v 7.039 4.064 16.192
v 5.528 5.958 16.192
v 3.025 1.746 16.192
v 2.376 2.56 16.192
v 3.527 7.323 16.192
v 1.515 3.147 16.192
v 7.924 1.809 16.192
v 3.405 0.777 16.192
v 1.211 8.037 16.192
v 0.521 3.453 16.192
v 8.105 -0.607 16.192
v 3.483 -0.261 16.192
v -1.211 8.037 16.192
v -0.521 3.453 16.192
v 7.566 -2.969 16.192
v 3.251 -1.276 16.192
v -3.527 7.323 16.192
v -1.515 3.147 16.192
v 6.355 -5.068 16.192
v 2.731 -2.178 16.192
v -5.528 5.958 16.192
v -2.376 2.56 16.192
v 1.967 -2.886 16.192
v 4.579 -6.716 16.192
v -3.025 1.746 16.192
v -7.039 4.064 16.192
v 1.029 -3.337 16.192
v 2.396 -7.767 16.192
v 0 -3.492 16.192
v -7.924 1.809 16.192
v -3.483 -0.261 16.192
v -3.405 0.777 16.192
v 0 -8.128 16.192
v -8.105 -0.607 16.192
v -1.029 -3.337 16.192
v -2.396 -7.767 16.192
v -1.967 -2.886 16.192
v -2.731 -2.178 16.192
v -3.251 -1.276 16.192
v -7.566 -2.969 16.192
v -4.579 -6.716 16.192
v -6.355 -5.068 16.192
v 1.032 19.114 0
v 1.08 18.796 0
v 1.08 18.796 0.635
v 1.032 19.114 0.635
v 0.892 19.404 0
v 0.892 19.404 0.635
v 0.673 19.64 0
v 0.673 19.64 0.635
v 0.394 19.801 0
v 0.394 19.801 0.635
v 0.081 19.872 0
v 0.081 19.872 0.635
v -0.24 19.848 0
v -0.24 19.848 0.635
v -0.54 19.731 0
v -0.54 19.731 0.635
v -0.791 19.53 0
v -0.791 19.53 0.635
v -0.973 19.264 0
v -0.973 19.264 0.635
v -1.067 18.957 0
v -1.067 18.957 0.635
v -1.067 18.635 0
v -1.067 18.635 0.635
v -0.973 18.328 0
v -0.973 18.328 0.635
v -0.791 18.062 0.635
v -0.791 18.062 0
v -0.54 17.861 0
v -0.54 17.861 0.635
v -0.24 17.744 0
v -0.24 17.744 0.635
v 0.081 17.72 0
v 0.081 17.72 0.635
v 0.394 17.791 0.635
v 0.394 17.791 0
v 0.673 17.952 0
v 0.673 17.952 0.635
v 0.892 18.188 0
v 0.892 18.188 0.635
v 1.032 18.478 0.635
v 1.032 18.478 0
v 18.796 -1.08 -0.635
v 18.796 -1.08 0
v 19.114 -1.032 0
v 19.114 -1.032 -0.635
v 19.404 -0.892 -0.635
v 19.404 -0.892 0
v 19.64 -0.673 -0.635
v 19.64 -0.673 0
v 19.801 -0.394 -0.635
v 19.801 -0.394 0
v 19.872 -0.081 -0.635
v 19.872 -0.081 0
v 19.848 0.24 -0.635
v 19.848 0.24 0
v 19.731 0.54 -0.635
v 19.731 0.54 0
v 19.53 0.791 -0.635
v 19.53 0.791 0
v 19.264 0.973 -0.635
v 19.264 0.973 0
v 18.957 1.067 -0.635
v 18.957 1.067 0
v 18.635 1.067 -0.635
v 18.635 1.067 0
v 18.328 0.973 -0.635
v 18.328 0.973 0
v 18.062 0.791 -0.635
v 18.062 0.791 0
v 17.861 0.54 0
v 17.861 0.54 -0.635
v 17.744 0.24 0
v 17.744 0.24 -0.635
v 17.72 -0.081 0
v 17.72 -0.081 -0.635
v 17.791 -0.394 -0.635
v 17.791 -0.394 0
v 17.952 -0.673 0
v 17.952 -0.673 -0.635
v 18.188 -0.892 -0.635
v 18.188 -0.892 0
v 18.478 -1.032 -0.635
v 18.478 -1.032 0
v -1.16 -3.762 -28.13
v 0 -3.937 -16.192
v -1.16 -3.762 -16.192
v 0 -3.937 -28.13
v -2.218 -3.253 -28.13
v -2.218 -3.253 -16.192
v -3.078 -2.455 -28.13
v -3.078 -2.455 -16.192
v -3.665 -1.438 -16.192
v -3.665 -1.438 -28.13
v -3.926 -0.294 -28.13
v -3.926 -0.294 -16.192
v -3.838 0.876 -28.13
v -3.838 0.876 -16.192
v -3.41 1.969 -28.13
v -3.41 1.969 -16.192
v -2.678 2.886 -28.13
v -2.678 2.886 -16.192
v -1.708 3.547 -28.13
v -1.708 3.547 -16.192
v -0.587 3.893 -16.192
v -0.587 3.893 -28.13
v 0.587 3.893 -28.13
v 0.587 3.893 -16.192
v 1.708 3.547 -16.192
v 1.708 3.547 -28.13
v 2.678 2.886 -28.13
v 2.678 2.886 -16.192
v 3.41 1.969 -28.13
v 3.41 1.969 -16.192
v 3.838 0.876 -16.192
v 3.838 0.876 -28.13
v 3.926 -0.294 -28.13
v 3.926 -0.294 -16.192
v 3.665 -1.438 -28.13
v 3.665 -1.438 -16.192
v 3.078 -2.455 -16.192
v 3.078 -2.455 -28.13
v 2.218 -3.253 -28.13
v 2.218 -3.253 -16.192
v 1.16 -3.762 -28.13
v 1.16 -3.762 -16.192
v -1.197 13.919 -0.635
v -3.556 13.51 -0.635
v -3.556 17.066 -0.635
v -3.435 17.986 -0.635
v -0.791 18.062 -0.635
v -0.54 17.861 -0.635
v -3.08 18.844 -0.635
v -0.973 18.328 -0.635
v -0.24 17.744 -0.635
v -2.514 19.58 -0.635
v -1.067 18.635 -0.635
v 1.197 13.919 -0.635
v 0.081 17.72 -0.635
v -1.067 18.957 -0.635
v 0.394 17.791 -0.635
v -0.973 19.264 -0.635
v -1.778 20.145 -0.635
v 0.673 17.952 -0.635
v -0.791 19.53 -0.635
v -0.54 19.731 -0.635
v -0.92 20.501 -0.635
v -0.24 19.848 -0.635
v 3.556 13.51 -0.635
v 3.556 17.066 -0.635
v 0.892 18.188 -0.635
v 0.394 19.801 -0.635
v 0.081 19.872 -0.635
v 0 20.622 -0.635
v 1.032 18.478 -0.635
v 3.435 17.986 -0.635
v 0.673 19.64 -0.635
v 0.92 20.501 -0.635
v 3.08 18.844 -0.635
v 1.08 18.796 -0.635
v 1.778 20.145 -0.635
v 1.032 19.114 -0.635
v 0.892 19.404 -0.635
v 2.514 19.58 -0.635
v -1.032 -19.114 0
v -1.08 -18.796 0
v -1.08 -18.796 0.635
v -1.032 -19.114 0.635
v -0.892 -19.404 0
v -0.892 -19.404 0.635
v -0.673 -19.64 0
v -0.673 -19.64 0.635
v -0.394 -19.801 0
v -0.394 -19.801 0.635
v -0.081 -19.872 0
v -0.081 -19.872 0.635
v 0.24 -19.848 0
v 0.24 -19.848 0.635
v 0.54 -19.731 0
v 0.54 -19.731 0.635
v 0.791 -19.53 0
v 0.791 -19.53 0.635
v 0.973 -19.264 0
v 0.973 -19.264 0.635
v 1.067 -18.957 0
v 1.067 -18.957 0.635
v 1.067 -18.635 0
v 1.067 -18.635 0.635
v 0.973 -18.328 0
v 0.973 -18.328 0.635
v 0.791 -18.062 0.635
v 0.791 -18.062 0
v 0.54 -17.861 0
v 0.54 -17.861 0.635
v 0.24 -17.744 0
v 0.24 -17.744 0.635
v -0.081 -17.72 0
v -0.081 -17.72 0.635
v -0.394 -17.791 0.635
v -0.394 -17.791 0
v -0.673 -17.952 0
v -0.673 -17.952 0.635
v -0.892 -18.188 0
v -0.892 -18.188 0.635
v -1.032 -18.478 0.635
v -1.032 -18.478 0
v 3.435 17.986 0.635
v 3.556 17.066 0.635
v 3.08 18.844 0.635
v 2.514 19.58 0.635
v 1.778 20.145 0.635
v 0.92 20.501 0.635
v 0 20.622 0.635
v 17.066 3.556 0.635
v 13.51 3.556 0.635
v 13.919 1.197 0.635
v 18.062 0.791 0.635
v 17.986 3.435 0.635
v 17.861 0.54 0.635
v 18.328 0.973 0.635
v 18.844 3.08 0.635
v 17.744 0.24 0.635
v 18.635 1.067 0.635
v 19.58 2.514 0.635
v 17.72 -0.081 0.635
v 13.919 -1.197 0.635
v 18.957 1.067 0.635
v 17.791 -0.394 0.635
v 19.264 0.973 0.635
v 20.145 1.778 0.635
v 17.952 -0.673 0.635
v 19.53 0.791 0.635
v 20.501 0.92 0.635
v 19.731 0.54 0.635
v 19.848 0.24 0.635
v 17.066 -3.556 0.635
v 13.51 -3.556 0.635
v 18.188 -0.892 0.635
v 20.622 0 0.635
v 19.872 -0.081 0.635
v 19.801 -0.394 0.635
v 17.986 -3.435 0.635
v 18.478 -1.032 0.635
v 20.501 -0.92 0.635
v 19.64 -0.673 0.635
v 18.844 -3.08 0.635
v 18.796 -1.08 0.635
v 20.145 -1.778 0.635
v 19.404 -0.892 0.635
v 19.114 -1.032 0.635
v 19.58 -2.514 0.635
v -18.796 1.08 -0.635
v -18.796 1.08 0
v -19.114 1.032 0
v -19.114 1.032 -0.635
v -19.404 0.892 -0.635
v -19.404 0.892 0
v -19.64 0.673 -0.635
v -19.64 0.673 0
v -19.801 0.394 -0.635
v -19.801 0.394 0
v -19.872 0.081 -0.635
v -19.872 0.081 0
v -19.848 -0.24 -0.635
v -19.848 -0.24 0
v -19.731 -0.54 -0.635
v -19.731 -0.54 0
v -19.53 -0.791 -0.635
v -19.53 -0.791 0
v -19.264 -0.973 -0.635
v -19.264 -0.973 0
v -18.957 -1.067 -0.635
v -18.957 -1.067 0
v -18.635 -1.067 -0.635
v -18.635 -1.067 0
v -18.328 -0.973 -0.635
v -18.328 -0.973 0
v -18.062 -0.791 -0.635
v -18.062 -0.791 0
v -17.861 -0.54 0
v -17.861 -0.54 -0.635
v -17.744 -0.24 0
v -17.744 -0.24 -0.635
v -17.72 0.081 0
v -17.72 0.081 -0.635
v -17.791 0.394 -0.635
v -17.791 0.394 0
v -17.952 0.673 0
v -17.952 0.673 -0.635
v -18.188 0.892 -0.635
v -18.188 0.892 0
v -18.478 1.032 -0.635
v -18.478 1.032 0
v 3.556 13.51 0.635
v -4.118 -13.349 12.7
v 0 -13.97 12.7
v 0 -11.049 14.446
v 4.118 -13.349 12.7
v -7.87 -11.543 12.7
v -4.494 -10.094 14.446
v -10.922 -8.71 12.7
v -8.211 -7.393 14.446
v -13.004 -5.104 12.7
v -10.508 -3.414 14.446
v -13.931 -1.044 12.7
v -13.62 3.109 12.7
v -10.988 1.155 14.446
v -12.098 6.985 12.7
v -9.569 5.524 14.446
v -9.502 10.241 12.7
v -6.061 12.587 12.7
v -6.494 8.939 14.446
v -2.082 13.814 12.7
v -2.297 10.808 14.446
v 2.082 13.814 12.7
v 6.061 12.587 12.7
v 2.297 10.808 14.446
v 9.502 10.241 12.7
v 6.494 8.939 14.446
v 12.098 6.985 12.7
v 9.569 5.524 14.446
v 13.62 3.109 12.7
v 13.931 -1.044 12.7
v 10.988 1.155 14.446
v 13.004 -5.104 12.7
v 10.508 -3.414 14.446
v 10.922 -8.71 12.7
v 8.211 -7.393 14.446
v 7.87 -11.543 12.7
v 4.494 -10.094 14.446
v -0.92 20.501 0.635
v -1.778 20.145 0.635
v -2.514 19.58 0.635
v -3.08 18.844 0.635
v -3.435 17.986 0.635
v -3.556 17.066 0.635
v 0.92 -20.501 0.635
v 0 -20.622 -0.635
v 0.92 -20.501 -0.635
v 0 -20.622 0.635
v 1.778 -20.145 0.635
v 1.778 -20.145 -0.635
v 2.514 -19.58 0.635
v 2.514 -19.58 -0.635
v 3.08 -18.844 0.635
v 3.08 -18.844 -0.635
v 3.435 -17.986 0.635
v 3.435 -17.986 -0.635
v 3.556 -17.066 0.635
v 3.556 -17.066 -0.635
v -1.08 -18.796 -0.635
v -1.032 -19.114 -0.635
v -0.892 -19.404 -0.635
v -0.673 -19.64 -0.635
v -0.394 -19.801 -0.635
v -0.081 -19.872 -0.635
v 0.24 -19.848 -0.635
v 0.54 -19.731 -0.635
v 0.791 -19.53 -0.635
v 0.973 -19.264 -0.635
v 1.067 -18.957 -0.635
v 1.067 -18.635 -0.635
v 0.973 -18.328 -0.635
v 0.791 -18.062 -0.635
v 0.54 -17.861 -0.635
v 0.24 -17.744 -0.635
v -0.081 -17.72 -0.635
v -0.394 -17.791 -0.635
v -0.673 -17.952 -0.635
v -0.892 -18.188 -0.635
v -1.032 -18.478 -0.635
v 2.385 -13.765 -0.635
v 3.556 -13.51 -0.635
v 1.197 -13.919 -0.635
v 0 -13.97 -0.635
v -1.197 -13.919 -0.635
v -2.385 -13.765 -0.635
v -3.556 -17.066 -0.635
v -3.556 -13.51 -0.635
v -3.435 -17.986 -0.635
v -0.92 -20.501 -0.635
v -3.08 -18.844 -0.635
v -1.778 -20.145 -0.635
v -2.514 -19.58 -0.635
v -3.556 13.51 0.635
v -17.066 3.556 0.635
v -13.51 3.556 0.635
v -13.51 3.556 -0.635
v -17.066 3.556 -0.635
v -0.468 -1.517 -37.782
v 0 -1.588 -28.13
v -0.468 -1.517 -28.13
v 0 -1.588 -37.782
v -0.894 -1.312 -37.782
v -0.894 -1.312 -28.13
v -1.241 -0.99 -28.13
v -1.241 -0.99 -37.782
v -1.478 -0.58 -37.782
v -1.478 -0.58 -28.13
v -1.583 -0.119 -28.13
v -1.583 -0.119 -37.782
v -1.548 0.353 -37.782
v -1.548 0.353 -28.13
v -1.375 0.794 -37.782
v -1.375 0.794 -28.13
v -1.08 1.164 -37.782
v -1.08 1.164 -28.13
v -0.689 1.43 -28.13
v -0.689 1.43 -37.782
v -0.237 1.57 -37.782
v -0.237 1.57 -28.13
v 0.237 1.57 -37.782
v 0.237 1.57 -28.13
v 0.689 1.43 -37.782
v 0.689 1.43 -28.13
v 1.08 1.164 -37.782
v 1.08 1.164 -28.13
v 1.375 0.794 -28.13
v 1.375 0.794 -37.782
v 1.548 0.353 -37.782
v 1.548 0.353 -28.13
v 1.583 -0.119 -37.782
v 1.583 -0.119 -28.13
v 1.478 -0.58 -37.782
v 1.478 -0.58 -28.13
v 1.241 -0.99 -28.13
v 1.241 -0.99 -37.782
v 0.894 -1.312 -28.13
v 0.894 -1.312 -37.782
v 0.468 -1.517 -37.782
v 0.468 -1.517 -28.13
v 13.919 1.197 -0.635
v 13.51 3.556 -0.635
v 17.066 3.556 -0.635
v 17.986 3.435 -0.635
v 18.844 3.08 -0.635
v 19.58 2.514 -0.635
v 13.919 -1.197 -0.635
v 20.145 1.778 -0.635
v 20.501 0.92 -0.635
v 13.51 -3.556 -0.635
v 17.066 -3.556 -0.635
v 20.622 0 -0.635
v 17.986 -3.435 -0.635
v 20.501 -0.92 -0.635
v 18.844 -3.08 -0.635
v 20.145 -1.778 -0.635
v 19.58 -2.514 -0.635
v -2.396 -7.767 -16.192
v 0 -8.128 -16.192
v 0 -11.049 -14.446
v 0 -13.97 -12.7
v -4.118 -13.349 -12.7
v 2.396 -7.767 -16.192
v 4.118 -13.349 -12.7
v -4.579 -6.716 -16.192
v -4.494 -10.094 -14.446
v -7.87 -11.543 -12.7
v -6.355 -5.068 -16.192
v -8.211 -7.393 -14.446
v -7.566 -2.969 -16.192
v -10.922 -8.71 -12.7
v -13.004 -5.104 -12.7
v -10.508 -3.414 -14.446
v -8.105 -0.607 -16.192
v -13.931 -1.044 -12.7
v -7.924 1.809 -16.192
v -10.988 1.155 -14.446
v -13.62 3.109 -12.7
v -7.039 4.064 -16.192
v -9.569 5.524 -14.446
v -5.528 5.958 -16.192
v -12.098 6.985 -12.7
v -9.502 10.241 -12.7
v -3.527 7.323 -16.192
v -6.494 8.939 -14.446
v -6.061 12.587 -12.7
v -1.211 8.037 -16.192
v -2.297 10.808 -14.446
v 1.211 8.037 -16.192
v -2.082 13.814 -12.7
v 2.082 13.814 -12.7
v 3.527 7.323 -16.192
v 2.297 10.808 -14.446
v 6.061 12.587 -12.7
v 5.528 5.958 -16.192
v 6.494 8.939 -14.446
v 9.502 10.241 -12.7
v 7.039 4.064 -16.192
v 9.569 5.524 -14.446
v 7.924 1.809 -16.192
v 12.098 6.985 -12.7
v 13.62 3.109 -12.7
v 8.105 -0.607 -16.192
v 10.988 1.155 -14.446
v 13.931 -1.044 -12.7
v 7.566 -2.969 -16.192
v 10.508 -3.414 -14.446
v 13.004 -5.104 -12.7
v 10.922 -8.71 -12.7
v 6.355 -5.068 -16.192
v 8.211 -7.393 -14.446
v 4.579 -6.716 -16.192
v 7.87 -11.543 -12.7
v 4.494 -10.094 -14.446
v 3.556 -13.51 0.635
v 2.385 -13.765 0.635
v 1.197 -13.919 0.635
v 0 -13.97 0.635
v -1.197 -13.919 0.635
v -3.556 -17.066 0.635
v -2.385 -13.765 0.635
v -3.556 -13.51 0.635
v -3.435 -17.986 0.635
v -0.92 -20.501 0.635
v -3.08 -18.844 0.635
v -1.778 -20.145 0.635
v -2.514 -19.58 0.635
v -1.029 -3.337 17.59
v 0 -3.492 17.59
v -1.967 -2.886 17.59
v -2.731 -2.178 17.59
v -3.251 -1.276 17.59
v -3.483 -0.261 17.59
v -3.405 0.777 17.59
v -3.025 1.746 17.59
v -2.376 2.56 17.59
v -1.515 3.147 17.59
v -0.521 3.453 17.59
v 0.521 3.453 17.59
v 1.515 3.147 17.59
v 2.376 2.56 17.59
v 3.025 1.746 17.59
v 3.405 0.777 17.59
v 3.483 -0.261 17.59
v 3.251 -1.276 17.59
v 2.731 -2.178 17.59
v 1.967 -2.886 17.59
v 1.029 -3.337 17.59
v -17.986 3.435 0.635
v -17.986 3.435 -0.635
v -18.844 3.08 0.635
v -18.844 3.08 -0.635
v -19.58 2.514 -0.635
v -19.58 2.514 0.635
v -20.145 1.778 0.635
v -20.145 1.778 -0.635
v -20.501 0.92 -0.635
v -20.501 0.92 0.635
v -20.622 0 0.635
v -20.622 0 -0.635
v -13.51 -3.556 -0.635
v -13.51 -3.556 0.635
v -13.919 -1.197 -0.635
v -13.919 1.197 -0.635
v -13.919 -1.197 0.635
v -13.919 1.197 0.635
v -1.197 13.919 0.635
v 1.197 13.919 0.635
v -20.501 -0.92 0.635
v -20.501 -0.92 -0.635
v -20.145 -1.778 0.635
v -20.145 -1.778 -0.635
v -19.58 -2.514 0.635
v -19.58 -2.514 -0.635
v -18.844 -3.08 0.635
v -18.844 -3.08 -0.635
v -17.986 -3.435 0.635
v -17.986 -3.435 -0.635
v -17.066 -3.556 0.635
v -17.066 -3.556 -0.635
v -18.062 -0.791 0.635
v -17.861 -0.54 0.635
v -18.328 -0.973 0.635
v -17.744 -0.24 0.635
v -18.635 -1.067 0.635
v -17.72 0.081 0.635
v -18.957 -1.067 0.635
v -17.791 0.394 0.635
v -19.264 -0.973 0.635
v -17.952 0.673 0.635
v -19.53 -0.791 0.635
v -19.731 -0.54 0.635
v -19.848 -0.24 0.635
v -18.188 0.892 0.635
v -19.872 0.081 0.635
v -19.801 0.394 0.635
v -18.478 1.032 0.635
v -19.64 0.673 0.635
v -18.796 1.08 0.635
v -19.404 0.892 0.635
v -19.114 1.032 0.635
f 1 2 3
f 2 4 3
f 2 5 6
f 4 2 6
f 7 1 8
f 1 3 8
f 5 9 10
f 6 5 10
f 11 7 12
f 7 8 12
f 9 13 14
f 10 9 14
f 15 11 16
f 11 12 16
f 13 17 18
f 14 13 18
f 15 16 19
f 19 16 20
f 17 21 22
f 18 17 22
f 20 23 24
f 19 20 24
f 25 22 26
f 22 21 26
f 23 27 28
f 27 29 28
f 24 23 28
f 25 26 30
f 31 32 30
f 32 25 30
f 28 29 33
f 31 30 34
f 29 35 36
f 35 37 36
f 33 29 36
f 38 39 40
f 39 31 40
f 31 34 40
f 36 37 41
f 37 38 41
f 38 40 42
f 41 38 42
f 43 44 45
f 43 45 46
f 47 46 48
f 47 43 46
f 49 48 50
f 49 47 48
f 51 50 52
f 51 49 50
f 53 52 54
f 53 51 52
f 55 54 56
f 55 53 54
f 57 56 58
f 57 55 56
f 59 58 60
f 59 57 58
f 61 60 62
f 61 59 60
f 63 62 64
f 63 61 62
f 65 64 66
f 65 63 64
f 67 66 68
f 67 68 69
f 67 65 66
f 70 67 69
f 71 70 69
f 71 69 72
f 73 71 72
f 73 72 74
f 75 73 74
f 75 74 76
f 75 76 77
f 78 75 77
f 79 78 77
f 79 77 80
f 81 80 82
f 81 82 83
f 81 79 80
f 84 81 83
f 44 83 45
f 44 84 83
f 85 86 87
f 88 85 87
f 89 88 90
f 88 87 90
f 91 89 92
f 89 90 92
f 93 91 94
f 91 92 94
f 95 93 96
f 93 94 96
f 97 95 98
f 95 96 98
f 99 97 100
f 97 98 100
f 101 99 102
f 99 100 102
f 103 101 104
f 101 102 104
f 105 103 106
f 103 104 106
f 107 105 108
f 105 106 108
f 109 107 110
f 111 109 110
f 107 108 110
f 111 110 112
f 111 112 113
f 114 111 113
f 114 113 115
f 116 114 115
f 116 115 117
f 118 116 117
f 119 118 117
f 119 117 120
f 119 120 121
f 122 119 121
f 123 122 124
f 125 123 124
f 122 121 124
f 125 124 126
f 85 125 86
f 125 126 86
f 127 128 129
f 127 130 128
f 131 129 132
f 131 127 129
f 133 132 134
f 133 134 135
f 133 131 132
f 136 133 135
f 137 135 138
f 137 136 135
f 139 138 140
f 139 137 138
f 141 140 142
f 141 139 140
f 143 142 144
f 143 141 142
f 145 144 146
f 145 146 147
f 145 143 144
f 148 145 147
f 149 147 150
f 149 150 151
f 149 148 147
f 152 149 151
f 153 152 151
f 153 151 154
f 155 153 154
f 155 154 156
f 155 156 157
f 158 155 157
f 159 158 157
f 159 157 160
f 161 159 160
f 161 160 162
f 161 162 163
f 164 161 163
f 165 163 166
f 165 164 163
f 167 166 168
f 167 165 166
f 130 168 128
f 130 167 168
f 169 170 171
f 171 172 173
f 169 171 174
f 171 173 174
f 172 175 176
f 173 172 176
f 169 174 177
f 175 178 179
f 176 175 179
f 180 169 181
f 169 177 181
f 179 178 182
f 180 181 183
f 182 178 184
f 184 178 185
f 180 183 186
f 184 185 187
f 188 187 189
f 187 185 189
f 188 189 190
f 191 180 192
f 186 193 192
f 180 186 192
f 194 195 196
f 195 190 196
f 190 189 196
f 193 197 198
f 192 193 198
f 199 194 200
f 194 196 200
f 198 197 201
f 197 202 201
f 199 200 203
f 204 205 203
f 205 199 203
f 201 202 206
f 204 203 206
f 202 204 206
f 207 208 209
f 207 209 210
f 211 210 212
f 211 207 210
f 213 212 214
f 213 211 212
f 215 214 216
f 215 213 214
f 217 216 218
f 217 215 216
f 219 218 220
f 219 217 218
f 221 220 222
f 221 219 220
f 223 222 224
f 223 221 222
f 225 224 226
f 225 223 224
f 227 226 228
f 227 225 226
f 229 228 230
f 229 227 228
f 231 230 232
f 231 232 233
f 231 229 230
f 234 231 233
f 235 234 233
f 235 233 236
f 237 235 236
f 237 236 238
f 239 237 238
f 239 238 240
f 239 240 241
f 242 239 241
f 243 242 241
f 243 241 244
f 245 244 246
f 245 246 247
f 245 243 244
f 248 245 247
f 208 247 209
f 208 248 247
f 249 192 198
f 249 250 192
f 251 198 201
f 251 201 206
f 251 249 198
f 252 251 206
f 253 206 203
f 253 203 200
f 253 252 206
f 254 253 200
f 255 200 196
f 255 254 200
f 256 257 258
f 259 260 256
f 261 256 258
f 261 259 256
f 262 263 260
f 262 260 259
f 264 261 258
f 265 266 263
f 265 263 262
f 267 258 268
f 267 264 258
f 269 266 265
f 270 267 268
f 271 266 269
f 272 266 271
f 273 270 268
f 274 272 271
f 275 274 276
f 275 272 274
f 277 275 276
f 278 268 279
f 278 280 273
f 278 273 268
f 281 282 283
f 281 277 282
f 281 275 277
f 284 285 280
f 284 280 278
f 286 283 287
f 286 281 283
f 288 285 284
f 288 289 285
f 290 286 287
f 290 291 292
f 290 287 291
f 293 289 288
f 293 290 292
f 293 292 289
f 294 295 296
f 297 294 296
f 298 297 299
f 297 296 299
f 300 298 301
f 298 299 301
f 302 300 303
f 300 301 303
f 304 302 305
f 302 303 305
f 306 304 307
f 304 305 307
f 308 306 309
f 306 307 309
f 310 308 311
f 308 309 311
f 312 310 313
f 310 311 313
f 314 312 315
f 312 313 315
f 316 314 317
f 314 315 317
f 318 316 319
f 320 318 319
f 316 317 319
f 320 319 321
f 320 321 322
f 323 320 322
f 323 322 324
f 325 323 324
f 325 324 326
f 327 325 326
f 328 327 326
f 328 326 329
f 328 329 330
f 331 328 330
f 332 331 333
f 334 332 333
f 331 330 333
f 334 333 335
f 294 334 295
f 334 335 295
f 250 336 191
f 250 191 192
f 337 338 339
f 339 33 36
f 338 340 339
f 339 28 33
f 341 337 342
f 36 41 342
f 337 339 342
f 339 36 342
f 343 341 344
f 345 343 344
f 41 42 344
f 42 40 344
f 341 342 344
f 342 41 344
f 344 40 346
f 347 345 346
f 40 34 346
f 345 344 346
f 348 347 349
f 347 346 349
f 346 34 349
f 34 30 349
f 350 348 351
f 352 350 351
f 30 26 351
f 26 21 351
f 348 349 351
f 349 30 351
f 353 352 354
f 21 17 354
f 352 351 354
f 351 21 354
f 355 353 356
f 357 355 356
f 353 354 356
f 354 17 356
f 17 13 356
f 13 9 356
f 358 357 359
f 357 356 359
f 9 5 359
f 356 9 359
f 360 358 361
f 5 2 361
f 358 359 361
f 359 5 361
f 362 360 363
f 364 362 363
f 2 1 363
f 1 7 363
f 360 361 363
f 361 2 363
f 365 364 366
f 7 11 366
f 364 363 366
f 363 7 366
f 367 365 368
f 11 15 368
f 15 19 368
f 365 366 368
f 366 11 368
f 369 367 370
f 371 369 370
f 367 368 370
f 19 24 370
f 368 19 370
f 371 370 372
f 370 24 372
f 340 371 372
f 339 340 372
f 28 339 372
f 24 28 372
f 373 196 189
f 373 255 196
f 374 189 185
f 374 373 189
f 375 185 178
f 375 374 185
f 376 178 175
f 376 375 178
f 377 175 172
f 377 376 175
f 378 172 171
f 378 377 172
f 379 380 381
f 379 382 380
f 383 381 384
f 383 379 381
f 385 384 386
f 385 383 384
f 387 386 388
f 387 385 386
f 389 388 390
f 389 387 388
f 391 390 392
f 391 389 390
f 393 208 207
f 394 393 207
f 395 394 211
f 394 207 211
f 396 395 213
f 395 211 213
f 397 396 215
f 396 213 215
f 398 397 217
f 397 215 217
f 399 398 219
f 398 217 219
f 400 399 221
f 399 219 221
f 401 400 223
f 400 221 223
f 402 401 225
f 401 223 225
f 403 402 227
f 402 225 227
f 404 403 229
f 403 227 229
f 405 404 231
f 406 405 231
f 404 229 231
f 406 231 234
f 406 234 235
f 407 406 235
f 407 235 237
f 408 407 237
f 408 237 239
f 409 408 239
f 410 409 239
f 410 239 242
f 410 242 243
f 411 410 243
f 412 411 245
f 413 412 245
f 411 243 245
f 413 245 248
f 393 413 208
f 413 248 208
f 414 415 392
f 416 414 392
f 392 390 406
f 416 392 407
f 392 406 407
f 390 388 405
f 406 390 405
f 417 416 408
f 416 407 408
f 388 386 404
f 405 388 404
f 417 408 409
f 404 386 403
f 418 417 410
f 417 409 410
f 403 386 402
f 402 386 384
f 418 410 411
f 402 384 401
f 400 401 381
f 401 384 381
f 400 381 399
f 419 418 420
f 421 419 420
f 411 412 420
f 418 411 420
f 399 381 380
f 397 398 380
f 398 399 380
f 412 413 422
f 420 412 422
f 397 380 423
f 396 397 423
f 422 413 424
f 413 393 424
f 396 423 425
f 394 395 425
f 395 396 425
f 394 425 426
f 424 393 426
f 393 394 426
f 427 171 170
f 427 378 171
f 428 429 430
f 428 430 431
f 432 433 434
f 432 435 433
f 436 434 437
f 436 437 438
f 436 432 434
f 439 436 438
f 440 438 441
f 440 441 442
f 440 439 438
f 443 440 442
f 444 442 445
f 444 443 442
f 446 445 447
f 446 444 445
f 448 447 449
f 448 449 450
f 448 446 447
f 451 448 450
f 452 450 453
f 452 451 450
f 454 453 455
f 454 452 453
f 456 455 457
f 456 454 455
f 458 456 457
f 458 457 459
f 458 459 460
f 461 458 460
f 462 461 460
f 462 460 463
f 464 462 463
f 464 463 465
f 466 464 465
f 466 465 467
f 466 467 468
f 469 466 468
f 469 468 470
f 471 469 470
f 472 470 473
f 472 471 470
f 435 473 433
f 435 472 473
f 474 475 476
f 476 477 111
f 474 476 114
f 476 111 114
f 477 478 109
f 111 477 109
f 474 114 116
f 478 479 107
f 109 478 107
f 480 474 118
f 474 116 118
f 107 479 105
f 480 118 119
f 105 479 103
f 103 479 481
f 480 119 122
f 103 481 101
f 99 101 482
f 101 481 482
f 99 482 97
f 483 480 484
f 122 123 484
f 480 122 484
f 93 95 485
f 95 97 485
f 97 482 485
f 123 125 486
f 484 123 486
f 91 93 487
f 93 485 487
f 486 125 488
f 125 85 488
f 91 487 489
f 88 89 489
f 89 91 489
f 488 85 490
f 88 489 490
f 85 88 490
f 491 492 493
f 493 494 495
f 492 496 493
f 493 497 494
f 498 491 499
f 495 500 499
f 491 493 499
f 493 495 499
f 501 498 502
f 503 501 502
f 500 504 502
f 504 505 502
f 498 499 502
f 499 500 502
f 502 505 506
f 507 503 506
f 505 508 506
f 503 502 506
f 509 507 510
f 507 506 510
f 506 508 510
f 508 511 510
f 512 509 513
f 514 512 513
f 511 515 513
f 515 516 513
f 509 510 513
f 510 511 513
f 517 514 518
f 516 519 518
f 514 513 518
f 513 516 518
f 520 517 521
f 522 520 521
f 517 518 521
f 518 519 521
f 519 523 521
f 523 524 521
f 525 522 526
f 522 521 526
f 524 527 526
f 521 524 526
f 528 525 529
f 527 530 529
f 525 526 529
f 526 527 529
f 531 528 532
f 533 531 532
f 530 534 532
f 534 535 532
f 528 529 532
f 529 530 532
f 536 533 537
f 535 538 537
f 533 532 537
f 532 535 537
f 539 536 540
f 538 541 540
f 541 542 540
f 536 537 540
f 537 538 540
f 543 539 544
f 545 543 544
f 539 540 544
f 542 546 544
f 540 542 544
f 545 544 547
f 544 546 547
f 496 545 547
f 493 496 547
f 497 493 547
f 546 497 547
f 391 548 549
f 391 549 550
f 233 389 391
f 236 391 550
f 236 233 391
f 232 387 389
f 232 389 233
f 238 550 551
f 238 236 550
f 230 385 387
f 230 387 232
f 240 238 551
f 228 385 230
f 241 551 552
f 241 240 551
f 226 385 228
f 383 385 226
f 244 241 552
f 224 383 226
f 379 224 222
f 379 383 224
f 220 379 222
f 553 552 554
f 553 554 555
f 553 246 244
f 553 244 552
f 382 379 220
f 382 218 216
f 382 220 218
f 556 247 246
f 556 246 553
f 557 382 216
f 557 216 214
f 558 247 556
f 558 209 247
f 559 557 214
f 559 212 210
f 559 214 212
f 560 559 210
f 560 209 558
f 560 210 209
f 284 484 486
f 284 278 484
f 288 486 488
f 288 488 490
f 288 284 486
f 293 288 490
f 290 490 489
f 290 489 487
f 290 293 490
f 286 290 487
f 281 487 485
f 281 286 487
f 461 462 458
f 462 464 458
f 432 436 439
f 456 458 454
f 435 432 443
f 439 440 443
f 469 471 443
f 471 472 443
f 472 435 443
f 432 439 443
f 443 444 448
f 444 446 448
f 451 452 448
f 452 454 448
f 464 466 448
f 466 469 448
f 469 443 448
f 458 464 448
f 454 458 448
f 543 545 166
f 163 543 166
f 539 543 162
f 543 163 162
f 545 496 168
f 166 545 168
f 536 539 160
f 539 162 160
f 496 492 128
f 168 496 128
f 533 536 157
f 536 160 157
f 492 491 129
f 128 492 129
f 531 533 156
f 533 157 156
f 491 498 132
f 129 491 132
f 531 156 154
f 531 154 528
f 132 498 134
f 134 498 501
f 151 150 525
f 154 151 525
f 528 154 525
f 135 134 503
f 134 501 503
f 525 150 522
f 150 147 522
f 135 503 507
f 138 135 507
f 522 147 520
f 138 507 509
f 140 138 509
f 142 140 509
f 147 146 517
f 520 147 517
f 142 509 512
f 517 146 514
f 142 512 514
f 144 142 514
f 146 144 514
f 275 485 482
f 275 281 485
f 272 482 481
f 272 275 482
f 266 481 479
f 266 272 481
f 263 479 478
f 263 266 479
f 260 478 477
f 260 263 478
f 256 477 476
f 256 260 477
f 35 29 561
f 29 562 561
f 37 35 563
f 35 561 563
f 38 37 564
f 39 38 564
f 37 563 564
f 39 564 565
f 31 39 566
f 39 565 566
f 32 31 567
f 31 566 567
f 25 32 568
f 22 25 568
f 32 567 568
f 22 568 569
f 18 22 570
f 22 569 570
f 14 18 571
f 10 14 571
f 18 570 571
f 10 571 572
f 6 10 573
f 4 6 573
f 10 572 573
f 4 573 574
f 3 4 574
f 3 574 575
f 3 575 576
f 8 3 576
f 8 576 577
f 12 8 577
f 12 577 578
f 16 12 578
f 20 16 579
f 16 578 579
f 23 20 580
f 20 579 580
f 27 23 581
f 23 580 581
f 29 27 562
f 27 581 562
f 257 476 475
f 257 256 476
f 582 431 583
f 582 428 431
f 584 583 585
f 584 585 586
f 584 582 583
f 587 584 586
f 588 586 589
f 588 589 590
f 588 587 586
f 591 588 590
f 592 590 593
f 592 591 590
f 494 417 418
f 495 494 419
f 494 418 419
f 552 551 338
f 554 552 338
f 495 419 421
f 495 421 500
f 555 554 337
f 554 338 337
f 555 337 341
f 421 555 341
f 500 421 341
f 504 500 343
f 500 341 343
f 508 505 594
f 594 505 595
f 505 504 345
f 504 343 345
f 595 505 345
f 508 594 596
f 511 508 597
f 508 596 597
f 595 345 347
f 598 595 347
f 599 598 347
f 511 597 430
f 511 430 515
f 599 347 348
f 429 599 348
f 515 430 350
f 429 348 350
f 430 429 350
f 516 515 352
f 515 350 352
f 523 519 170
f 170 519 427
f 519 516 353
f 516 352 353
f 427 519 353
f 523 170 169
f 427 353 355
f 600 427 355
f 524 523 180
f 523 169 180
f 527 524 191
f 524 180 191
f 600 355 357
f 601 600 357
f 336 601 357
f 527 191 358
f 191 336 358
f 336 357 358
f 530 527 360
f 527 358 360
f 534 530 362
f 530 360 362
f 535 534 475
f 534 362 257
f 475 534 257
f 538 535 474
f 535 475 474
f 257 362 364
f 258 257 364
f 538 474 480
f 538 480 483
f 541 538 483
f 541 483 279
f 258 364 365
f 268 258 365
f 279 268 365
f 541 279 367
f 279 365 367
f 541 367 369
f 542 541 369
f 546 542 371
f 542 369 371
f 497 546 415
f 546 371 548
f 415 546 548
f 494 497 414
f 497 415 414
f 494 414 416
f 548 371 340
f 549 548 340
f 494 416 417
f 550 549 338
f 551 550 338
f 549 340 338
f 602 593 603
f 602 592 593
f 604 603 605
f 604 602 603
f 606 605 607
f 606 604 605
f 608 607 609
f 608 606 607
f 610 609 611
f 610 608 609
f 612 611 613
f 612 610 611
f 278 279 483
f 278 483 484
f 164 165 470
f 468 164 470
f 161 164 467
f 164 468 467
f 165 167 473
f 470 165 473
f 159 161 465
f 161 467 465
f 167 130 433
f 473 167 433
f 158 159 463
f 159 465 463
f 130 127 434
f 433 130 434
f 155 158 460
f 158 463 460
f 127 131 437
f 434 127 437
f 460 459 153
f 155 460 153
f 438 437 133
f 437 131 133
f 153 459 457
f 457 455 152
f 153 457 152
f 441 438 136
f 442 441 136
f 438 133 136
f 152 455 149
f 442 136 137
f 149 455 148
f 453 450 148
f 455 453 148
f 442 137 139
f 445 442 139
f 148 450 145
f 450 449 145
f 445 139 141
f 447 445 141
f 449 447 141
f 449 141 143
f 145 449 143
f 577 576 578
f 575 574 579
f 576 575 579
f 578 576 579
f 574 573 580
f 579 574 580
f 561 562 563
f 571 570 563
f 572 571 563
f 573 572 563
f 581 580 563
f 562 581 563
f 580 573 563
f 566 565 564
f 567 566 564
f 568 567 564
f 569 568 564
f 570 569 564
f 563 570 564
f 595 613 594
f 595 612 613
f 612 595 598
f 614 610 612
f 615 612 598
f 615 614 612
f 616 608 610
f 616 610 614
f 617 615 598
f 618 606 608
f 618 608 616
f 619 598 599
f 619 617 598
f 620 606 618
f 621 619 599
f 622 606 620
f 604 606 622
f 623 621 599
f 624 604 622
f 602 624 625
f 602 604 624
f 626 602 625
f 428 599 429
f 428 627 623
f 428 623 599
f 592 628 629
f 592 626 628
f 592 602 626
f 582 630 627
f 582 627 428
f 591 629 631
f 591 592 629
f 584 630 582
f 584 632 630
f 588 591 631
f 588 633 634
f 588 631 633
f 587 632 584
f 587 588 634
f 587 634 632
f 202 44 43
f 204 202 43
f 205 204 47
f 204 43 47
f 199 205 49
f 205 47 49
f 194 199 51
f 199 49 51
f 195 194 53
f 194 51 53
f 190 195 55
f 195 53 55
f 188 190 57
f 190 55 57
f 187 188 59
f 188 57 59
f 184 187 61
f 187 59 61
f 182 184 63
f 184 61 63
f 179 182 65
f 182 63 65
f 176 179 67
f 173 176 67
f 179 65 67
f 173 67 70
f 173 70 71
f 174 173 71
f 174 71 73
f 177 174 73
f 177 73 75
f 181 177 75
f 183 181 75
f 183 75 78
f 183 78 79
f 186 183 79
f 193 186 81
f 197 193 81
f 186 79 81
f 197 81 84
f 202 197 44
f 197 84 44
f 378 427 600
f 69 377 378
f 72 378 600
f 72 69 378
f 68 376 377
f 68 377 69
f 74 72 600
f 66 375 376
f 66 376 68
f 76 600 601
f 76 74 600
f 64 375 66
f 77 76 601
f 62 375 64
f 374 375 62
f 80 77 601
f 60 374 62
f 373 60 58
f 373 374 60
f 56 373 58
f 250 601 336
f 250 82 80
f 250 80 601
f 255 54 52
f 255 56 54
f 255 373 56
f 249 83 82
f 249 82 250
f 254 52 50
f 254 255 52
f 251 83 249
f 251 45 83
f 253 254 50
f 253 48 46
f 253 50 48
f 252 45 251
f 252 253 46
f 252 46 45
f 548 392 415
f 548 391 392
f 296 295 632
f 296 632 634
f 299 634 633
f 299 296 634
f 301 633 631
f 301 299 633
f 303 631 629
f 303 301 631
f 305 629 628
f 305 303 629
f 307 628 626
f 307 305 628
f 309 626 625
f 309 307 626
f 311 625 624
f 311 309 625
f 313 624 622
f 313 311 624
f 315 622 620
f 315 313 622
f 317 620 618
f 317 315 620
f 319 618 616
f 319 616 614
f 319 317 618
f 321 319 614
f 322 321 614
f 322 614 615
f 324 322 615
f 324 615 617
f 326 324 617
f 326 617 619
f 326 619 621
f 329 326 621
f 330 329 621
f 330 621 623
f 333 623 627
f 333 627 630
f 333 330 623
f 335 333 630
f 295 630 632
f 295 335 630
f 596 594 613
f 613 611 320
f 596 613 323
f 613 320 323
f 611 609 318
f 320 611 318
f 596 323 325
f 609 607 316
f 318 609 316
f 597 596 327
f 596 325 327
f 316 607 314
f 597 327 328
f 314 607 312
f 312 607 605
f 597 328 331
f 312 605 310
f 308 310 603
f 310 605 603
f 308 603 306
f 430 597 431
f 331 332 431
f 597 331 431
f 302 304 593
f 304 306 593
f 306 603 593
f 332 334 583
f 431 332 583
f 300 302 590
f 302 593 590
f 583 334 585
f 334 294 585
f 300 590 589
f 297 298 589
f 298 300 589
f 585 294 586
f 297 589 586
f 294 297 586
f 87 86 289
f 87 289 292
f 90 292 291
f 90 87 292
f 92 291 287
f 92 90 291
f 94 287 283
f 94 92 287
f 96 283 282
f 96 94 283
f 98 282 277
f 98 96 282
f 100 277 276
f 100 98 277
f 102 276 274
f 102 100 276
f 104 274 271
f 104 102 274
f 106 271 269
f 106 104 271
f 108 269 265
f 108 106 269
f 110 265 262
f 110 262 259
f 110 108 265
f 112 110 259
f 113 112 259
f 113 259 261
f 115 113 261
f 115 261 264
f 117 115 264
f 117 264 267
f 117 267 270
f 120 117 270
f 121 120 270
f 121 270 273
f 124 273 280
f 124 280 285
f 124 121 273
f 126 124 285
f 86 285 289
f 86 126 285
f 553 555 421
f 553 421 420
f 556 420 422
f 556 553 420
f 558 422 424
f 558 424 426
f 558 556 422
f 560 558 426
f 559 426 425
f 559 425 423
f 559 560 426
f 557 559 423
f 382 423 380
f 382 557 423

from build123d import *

# Parameters (mm, degrees)
SKETCH3_R           = 1.0795
BOSS_EXTRUDE2_DEPTH = 0.635
CIRPATTERN1_COUNT   = 4


with BuildPart() as part:
    # Sketch2 → Revolve1 (revolve)
    with BuildSketch(Plane(origin=(0, 0, 0), x_dir=(0, 0, -1), z_dir=(1, 0, 0))):
        Polygon((-17.5895, 0), (37.7825, 0), (37.7825, 1.5875), (28.1305, 1.5875), (28.1305, 3.937), (16.1925, 3.937), (16.1925, 8.128), (12.7, 13.97), (-12.7, 13.97), (-16.1925, 8.128), (-16.1925, 3.4925), (-17.5895, 3.4925), align=None)
    revolve(axis=Axis((0, 0, 16.1925), (0, 0, -1)))

    # Sketch3 → Boss-Extrude2 (add, symmetric)
    with BuildSketch(Plane.XY):
        with BuildLine():
            Line((-3.556, 17.065839525), (-3.556, 13.509839525))
            ThreePointArc((-3.556, 13.509839525), (0, 13.97), (3.556, 13.509839525))
            Line((3.556, 13.509839525), (3.556, 17.065839525))
            ThreePointArc((3.556, 17.065839525), (2.514471721, 19.580311232), (2.1e-08, 20.621839525))
            ThreePointArc((2.1e-08, 20.621839525), (-2.514471707, 19.580311247), (-3.556, 17.065839525))
        make_face()
        with Locations((0, 18.796)):
            Circle(SKETCH3_R, mode=Mode.SUBTRACT)
    boss_extrude2 = extrude(amount=BOSS_EXTRUDE2_DEPTH, both=True)

    # CirPattern1: Boss-Extrude2 ×4 about axis
    cirpattern1_axis = Axis((0, 0, -12.7), (0, 0, 1))
    for i in range(1, CIRPATTERN1_COUNT):
        add(boss_extrude2.rotate(cirpattern1_axis, i * 360 / CIRPATTERN1_COUNT))


solid = part.part
